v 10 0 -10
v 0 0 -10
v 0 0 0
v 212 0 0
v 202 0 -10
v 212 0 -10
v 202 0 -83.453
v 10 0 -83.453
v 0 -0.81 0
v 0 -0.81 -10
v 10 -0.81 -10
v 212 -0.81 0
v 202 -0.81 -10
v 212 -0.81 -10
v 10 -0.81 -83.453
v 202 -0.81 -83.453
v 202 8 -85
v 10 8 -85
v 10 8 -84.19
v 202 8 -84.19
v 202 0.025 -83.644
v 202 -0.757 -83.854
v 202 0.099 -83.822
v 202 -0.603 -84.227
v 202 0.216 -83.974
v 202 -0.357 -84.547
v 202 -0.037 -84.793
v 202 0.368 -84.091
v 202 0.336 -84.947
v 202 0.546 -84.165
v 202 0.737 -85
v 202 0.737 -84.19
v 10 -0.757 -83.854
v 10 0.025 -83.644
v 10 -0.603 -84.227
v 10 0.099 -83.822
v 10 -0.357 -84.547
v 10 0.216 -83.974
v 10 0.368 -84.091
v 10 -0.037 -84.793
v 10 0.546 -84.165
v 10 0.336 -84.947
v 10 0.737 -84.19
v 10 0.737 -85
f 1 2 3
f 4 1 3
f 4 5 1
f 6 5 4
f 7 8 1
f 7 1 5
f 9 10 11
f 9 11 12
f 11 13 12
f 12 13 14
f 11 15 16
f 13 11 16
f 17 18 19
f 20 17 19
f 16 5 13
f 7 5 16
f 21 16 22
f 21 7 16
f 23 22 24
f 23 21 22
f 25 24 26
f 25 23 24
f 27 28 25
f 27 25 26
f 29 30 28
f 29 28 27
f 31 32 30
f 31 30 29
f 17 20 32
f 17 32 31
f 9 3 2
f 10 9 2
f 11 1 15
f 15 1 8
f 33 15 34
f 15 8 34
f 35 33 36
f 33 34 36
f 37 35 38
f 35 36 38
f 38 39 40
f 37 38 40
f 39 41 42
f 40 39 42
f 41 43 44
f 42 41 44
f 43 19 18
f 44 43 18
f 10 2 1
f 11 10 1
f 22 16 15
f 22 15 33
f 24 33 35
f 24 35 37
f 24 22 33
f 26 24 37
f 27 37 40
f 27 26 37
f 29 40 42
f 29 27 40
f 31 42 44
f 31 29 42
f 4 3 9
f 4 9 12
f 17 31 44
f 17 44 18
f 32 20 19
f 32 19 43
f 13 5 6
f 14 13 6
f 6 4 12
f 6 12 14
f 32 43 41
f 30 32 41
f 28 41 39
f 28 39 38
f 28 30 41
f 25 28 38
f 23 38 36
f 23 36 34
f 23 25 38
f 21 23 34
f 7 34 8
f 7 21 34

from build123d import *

# Parameters (mm, degrees)
SKETCH1_W                    = 212
SKETCH1_H                    = 85
BASE_FLANGE1_DEPTH           = 0.81
CUT_EXTRUDE1_REACH           = 230.407
SKETCH6_W                    = 10
SKETCH6_H                    = 75
EDGE_FLANGE1_STRIP_W         = 4.7132
EDGE_FLANGE1_STRIP_H         = 0.81
EDGE_FLANGE1_STRIP_CUT_DEPTH = 192
EDGE_FLANGE1_DEPTH           = 192


# Sheet-metal steps are written as plain solids
with BuildPart() as part:
    # Sketch1 → Base-Flange1 (new body)
    with BuildSketch(Plane(origin=(0, 0, 0), x_dir=(1, 0, 0), z_dir=(0, 1, 0))):
        with Locations((106, 42.5)):
            Rectangle(SKETCH1_W, SKETCH1_H)
    extrude(amount=-BASE_FLANGE1_DEPTH)

    # Sketch6 → Cut-Extrude1 (cut, up to next)
    with BuildSketch(Plane(origin=(0, 0, 0), x_dir=(1, 0, 0), z_dir=(0, 1, 0)), mode=Mode.PRIVATE) as cut_extrude1_sk1:
        with Locations((5, 47.5)):
            Rectangle(SKETCH6_W, SKETCH6_H)
    cut_extrude1_tool1 = extrude(cut_extrude1_sk1.sketch, amount=-CUT_EXTRUDE1_REACH, mode=Mode.PRIVATE) & part.part
    # Sketch6 → Cut-Extrude1 (cut, up to next)
    with BuildSketch(Plane(origin=(0, 0, 0), x_dir=(1, 0, 0), z_dir=(0, 1, 0)), mode=Mode.PRIVATE) as cut_extrude1_sk2:
        with Locations((207, 47.5)):
            Rectangle(SKETCH6_W, SKETCH6_H)
    cut_extrude1_tool2 = extrude(cut_extrude1_sk2.sketch, amount=-CUT_EXTRUDE1_REACH, mode=Mode.PRIVATE) & part.part
    add(cut_extrude1_tool1.solids().sort_by_distance((5, 0, -47.5))[0], mode=Mode.SUBTRACT)
    add(cut_extrude1_tool2.solids().sort_by_distance((207, 0, -47.5))[0], mode=Mode.SUBTRACT)

    # Edge-Flange1 strip (across the edge) → Edge-Flange1 strip cut (cut)
    with BuildSketch(Plane(origin=(202, 0, -85), x_dir=(0, 0, 1), z_dir=(-1, 0, 0))):
        with Locations((-0.81, -0.405)):
            Rectangle(EDGE_FLANGE1_STRIP_W, EDGE_FLANGE1_STRIP_H)
    extrude(amount=EDGE_FLANGE1_STRIP_CUT_DEPTH, mode=Mode.SUBTRACT)

    # Edge-Flange1 section (across the edge) → Edge-Flange1 (add)
    with BuildSketch(Plane(origin=(202, 0, -85), x_dir=(0, 0, 1), z_dir=(-1, 0, 0))):
        with BuildLine():
            Line((0, 0.7366), (0, 8))
            Line((0, 8), (0.81, 8))
            Line((0.81, 8), (0.81, 0.7366))
            ThreePointArc((0.81, 0.7366), (1.025745145, 0.215745145), (1.5466, 0))
            Line((1.5466, 0), (1.5466, -0.81))
            ThreePointArc((1.5466, -0.81), (0.452988652, -0.357011348), (0, 0.7366))
        make_face()
    extrude(amount=EDGE_FLANGE1_DEPTH)


solid = part.part
